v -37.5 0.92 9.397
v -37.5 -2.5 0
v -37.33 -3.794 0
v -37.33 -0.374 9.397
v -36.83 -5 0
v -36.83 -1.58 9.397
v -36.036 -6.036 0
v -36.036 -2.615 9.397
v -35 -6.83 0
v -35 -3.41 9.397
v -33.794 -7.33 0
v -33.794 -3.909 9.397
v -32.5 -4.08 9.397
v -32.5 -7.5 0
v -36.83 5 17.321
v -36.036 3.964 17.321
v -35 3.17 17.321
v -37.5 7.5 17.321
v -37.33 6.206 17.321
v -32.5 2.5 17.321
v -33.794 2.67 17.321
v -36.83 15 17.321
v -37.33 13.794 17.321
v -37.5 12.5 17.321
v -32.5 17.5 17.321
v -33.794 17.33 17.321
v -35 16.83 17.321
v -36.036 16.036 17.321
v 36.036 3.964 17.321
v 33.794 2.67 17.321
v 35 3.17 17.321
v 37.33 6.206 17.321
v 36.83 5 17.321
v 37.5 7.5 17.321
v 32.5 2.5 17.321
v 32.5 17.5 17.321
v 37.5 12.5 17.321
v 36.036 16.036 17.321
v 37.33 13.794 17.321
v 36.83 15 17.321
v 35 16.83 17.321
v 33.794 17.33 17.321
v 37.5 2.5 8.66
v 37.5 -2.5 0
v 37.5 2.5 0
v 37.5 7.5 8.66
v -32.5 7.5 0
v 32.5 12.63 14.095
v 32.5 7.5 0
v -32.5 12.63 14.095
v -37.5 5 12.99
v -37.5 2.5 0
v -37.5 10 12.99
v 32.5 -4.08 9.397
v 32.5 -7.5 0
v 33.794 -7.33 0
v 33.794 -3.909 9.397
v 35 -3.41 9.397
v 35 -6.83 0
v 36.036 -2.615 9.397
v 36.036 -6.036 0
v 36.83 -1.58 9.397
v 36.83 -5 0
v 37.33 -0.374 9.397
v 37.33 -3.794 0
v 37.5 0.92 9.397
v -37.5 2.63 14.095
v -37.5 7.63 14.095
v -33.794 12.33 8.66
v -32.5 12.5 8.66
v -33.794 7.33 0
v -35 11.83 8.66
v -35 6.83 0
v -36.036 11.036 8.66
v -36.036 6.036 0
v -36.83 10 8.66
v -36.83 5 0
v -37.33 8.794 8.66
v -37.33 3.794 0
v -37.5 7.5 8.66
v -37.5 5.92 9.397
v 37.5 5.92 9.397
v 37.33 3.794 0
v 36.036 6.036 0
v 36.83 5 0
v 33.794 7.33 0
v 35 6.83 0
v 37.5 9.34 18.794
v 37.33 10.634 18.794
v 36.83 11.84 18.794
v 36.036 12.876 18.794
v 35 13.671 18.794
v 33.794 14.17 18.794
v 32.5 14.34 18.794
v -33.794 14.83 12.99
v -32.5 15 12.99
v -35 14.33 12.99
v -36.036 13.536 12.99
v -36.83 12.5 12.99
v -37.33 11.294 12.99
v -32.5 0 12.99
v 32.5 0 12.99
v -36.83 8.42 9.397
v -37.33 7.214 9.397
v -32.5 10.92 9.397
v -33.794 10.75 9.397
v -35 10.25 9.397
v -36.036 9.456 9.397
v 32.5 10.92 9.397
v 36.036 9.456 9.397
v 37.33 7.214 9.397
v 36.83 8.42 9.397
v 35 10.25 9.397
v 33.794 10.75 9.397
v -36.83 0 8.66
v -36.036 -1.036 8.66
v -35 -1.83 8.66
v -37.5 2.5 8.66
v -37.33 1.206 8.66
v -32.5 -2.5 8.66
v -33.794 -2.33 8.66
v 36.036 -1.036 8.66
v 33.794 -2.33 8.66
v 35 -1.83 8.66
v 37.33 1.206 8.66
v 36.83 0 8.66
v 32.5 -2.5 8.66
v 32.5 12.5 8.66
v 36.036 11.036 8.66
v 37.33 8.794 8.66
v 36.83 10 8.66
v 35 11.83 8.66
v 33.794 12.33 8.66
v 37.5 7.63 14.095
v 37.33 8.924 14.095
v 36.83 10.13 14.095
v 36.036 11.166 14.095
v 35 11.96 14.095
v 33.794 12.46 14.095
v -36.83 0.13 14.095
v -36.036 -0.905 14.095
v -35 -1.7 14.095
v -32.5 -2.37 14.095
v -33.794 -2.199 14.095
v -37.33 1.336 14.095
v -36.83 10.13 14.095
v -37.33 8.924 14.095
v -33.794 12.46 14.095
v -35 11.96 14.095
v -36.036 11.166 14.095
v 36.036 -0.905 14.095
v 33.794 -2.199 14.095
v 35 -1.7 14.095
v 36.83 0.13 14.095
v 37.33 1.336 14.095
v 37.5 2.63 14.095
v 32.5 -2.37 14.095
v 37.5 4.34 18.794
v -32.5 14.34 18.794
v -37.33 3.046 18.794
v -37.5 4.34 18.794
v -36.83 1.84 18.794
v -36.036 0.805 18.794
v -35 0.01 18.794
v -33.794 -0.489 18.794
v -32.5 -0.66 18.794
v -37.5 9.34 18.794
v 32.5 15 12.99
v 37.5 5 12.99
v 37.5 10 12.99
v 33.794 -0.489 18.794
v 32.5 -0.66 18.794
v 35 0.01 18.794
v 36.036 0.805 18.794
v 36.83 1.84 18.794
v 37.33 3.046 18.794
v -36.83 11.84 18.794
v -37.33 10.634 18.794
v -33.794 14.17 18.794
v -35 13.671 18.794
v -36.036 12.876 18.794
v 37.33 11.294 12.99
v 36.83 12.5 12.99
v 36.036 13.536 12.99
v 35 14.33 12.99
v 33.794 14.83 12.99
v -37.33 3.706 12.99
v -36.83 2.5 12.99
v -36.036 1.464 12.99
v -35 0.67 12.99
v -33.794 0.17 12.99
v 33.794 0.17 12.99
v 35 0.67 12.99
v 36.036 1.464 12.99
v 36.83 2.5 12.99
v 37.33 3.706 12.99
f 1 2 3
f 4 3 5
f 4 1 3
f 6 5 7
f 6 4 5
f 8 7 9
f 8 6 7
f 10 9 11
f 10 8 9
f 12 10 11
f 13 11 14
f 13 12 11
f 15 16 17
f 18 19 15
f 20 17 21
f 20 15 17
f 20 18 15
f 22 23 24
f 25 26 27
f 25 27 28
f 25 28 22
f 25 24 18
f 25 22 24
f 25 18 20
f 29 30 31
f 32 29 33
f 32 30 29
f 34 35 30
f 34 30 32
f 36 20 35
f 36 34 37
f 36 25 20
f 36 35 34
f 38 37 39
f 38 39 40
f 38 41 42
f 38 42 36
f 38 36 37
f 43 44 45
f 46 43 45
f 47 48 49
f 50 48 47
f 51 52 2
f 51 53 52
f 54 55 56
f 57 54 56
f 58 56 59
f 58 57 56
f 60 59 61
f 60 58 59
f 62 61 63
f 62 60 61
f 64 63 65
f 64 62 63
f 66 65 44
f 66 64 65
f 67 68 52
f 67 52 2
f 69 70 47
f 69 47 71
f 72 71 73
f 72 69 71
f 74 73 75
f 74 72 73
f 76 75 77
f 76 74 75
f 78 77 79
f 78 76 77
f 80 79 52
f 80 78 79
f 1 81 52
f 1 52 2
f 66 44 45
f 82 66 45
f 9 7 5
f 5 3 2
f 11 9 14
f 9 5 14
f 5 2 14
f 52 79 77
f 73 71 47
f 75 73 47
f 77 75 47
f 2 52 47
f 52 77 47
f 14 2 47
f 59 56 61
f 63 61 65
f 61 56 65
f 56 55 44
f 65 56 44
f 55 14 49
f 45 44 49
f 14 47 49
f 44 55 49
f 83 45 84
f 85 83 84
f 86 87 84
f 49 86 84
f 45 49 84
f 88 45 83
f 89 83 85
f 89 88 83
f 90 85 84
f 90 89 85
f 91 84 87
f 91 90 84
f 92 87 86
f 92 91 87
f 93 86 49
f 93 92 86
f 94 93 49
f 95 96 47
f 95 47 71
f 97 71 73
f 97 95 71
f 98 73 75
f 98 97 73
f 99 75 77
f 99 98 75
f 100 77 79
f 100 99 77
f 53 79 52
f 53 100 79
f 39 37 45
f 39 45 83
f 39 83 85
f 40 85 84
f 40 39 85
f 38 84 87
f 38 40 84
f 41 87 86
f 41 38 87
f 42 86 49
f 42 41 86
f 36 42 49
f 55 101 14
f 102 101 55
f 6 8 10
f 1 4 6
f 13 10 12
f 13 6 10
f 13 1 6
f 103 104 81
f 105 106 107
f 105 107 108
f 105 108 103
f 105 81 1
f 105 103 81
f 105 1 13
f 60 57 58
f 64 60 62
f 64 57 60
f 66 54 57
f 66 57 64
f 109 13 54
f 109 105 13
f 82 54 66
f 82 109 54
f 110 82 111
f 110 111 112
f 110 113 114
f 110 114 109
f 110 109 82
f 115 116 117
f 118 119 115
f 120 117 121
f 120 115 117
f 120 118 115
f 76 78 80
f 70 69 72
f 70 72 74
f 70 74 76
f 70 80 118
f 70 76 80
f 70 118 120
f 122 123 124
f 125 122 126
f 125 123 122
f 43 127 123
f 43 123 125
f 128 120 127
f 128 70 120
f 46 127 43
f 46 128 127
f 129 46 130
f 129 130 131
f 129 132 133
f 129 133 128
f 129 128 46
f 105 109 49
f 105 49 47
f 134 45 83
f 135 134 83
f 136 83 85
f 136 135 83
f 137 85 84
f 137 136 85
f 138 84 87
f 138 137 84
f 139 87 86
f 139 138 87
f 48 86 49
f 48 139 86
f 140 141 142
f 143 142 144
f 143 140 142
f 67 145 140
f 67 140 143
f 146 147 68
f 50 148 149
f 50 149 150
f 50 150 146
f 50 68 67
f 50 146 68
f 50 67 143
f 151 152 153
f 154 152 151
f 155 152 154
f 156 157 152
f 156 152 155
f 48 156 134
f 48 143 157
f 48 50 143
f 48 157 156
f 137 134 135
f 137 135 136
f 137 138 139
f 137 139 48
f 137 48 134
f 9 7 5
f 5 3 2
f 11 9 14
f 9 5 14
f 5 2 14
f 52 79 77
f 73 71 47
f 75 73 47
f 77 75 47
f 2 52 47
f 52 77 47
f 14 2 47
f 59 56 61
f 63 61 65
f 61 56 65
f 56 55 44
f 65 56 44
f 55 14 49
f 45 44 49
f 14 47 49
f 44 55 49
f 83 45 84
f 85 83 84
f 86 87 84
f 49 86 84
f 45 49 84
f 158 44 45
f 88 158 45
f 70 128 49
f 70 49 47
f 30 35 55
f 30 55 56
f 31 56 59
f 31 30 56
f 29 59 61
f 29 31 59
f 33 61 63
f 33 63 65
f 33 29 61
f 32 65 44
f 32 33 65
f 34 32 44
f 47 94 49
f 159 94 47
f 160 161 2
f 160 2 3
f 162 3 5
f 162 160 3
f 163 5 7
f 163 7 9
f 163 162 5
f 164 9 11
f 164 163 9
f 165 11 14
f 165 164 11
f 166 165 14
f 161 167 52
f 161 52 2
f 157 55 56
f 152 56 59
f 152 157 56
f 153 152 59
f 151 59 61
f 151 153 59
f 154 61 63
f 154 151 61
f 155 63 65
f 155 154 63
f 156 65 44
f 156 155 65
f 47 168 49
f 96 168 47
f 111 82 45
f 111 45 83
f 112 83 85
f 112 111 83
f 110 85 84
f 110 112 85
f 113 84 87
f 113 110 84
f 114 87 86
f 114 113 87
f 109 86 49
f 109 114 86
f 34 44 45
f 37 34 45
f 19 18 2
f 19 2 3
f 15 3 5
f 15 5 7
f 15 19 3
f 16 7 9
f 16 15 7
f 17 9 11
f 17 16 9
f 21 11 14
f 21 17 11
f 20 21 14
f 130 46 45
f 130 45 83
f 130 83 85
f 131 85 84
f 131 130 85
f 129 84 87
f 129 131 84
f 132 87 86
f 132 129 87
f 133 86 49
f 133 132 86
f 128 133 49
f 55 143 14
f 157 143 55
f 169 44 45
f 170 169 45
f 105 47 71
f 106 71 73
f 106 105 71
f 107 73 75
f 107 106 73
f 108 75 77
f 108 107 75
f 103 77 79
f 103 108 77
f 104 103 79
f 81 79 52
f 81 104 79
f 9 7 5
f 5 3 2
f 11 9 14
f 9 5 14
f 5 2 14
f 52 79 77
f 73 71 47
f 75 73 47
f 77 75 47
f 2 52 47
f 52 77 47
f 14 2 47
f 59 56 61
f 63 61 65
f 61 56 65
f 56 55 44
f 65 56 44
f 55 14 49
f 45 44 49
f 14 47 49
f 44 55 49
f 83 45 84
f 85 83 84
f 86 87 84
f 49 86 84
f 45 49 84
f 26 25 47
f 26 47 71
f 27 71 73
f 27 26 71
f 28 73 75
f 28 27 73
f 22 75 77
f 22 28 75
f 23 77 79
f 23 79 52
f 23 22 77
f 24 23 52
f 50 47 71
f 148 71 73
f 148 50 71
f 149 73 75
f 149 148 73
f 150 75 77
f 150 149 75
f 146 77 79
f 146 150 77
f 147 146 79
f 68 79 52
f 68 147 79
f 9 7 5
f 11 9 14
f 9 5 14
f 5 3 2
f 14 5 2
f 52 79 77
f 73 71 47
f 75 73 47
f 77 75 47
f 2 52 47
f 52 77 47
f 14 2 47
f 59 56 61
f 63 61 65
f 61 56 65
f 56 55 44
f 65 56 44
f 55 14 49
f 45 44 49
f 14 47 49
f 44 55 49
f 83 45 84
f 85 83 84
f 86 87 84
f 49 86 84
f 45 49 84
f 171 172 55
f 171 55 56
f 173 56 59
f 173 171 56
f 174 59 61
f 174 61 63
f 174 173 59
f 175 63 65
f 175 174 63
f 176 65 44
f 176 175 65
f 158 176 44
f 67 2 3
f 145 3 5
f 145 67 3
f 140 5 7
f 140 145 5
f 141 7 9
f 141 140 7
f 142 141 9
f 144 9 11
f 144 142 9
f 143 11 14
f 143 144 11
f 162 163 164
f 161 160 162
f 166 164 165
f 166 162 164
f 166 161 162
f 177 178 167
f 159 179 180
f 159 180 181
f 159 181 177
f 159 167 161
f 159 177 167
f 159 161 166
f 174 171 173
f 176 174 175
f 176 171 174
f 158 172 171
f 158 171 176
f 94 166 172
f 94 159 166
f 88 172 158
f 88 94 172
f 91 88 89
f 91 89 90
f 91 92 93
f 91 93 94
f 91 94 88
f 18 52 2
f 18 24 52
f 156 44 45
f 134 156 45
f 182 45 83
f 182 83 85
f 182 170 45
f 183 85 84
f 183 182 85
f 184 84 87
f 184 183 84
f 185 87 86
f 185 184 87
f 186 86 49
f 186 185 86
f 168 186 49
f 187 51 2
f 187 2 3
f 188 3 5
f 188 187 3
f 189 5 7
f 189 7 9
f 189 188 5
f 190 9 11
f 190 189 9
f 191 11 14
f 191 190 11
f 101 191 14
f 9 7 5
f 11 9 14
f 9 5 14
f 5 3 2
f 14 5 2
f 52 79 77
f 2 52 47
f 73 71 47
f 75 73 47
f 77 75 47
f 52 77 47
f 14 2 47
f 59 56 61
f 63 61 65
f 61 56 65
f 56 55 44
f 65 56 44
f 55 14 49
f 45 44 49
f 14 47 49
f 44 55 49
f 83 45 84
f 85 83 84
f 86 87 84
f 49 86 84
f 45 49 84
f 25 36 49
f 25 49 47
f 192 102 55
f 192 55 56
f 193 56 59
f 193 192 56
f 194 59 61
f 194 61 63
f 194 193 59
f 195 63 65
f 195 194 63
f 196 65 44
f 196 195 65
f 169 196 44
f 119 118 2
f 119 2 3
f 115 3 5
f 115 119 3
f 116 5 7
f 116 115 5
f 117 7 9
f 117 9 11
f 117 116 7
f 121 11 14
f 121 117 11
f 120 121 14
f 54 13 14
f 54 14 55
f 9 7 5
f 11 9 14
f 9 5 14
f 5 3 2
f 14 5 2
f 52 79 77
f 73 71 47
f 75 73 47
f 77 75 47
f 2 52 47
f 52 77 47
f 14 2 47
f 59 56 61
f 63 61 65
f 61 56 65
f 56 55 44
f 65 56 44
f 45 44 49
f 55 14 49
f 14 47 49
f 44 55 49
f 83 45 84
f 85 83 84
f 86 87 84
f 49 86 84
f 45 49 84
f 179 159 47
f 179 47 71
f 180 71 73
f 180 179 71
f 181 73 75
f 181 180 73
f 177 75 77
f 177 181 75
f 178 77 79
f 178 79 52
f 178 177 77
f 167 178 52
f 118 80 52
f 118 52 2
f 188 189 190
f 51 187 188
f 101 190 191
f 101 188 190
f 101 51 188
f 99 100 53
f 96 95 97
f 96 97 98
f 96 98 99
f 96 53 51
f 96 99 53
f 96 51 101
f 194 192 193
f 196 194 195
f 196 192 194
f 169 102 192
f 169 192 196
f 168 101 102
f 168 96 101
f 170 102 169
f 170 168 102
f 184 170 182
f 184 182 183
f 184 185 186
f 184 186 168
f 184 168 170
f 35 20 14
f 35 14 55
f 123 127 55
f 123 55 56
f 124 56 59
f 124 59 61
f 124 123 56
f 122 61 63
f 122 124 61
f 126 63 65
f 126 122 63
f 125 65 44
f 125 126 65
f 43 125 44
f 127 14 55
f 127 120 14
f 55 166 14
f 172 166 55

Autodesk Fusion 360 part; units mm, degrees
sketch "Base" plane through (0, 0, 0) normal (0, 0, 1) x (1, 0, 0)
  line L0 (32.5, 7.5) -> (-32.5, 7.5)
  line L1 (-37.5, 2.5) -> (-37.5, -2.5)
  line L2 (-32.5, -7.5) -> (32.5, -7.5)
  line L3 (37.5, -2.5) -> (37.5, 2.5)
  line L4 (37.5, 7.5) -> (-37.5, -7.5) construction
  line L5 (-37.5, 7.5) -> (37.5, -7.5) construction
  arc A0 (-32.5, 7.5) -> (-37.5, 2.5) centre (-32.5, 2.5) ccw
  arc A1 (-37.5, -2.5) -> (-32.5, -7.5) centre (-32.5, -2.5) ccw
  arc A2 (32.5, -7.5) -> (37.5, -2.5) centre (32.5, -2.5) ccw
  arc A3 (37.5, 2.5) -> (32.5, 7.5) centre (32.5, 2.5) ccw
  dimension "d1" = 75
  dimension "d2" = 15
  dimension "d3" = 5
  dimension "d4" = 5
ref_plane "WorkPlane1" through (0, -7.5, 0) normal (0, -0.9397, 0.342) x (1, 0, 0)
sketch "20mm20deg" plane through (0, -6.6227, 2.4105) normal (0, -0.9397, 0.342) x (1, 0, 0)
  line L0 (0, 0) -> (0, 20)
  dimension "d6" = 20
sweep "Sweep1" add profiles "Base" path "20mm20deg" along L0 section 1 makes body 1
sketch "15mm20deg" plane through (0, -6.6227, 2.4105) normal (0, -0.9397, 0.342) x (1, 0, 0)
  line L0 (0, 0) -> (0, 15)
  dimension "d13" = 15
sweep "Sweep2" add profiles "Base" path "15mm20deg" along L0 section 1 separate body makes body 2
sketch "10mm20deg" plane through (0, -6.6227, 2.4105) normal (0, -0.9397, 0.342) x (1, 0, 0)
  line L0 (0, 0) -> (0, 10)
  dimension "d20" = 10
sweep "Sweep3" add profiles "Base" path "10mm20deg" along L0 section 1 separate body makes body 3
ref_plane "WorkPlane2" through (0, -7.5, 0) normal (0, -0.866, 0.5) x (1, 0, 0)
sketch "20mm30deg" plane through (0, -5.625, 3.2476) normal (0, -0.866, 0.5) x (1, 0, 0)
  line L0 (0, 0) -> (0, 20)
  dimension "d28" = 20
sketch "15mm30deg" plane through (0, -5.625, 3.2476) normal (0, -0.866, 0.5) x (1, 0, 0)
  line L0 (0, 0) -> (0, 15)
  dimension "d29" = 15
sketch "10mm30deg" plane through (0, -5.625, 3.2476) normal (0, -0.866, 0.5) x (1, 0, 0)
  line L0 (0, 0) -> (0, 10)
  dimension "d30" = 10
sweep "Sweep4" add profiles "Base" path "10mm30deg" along L0 section 1 separate body makes body 4
sweep "Sweep5" add profiles "Base" path "15mm30deg" along L0 section 1 separate body makes body 5
sweep "Sweep6" add profiles "Base" path "20mm30deg" along L0 section 1 separate body makes body 6
